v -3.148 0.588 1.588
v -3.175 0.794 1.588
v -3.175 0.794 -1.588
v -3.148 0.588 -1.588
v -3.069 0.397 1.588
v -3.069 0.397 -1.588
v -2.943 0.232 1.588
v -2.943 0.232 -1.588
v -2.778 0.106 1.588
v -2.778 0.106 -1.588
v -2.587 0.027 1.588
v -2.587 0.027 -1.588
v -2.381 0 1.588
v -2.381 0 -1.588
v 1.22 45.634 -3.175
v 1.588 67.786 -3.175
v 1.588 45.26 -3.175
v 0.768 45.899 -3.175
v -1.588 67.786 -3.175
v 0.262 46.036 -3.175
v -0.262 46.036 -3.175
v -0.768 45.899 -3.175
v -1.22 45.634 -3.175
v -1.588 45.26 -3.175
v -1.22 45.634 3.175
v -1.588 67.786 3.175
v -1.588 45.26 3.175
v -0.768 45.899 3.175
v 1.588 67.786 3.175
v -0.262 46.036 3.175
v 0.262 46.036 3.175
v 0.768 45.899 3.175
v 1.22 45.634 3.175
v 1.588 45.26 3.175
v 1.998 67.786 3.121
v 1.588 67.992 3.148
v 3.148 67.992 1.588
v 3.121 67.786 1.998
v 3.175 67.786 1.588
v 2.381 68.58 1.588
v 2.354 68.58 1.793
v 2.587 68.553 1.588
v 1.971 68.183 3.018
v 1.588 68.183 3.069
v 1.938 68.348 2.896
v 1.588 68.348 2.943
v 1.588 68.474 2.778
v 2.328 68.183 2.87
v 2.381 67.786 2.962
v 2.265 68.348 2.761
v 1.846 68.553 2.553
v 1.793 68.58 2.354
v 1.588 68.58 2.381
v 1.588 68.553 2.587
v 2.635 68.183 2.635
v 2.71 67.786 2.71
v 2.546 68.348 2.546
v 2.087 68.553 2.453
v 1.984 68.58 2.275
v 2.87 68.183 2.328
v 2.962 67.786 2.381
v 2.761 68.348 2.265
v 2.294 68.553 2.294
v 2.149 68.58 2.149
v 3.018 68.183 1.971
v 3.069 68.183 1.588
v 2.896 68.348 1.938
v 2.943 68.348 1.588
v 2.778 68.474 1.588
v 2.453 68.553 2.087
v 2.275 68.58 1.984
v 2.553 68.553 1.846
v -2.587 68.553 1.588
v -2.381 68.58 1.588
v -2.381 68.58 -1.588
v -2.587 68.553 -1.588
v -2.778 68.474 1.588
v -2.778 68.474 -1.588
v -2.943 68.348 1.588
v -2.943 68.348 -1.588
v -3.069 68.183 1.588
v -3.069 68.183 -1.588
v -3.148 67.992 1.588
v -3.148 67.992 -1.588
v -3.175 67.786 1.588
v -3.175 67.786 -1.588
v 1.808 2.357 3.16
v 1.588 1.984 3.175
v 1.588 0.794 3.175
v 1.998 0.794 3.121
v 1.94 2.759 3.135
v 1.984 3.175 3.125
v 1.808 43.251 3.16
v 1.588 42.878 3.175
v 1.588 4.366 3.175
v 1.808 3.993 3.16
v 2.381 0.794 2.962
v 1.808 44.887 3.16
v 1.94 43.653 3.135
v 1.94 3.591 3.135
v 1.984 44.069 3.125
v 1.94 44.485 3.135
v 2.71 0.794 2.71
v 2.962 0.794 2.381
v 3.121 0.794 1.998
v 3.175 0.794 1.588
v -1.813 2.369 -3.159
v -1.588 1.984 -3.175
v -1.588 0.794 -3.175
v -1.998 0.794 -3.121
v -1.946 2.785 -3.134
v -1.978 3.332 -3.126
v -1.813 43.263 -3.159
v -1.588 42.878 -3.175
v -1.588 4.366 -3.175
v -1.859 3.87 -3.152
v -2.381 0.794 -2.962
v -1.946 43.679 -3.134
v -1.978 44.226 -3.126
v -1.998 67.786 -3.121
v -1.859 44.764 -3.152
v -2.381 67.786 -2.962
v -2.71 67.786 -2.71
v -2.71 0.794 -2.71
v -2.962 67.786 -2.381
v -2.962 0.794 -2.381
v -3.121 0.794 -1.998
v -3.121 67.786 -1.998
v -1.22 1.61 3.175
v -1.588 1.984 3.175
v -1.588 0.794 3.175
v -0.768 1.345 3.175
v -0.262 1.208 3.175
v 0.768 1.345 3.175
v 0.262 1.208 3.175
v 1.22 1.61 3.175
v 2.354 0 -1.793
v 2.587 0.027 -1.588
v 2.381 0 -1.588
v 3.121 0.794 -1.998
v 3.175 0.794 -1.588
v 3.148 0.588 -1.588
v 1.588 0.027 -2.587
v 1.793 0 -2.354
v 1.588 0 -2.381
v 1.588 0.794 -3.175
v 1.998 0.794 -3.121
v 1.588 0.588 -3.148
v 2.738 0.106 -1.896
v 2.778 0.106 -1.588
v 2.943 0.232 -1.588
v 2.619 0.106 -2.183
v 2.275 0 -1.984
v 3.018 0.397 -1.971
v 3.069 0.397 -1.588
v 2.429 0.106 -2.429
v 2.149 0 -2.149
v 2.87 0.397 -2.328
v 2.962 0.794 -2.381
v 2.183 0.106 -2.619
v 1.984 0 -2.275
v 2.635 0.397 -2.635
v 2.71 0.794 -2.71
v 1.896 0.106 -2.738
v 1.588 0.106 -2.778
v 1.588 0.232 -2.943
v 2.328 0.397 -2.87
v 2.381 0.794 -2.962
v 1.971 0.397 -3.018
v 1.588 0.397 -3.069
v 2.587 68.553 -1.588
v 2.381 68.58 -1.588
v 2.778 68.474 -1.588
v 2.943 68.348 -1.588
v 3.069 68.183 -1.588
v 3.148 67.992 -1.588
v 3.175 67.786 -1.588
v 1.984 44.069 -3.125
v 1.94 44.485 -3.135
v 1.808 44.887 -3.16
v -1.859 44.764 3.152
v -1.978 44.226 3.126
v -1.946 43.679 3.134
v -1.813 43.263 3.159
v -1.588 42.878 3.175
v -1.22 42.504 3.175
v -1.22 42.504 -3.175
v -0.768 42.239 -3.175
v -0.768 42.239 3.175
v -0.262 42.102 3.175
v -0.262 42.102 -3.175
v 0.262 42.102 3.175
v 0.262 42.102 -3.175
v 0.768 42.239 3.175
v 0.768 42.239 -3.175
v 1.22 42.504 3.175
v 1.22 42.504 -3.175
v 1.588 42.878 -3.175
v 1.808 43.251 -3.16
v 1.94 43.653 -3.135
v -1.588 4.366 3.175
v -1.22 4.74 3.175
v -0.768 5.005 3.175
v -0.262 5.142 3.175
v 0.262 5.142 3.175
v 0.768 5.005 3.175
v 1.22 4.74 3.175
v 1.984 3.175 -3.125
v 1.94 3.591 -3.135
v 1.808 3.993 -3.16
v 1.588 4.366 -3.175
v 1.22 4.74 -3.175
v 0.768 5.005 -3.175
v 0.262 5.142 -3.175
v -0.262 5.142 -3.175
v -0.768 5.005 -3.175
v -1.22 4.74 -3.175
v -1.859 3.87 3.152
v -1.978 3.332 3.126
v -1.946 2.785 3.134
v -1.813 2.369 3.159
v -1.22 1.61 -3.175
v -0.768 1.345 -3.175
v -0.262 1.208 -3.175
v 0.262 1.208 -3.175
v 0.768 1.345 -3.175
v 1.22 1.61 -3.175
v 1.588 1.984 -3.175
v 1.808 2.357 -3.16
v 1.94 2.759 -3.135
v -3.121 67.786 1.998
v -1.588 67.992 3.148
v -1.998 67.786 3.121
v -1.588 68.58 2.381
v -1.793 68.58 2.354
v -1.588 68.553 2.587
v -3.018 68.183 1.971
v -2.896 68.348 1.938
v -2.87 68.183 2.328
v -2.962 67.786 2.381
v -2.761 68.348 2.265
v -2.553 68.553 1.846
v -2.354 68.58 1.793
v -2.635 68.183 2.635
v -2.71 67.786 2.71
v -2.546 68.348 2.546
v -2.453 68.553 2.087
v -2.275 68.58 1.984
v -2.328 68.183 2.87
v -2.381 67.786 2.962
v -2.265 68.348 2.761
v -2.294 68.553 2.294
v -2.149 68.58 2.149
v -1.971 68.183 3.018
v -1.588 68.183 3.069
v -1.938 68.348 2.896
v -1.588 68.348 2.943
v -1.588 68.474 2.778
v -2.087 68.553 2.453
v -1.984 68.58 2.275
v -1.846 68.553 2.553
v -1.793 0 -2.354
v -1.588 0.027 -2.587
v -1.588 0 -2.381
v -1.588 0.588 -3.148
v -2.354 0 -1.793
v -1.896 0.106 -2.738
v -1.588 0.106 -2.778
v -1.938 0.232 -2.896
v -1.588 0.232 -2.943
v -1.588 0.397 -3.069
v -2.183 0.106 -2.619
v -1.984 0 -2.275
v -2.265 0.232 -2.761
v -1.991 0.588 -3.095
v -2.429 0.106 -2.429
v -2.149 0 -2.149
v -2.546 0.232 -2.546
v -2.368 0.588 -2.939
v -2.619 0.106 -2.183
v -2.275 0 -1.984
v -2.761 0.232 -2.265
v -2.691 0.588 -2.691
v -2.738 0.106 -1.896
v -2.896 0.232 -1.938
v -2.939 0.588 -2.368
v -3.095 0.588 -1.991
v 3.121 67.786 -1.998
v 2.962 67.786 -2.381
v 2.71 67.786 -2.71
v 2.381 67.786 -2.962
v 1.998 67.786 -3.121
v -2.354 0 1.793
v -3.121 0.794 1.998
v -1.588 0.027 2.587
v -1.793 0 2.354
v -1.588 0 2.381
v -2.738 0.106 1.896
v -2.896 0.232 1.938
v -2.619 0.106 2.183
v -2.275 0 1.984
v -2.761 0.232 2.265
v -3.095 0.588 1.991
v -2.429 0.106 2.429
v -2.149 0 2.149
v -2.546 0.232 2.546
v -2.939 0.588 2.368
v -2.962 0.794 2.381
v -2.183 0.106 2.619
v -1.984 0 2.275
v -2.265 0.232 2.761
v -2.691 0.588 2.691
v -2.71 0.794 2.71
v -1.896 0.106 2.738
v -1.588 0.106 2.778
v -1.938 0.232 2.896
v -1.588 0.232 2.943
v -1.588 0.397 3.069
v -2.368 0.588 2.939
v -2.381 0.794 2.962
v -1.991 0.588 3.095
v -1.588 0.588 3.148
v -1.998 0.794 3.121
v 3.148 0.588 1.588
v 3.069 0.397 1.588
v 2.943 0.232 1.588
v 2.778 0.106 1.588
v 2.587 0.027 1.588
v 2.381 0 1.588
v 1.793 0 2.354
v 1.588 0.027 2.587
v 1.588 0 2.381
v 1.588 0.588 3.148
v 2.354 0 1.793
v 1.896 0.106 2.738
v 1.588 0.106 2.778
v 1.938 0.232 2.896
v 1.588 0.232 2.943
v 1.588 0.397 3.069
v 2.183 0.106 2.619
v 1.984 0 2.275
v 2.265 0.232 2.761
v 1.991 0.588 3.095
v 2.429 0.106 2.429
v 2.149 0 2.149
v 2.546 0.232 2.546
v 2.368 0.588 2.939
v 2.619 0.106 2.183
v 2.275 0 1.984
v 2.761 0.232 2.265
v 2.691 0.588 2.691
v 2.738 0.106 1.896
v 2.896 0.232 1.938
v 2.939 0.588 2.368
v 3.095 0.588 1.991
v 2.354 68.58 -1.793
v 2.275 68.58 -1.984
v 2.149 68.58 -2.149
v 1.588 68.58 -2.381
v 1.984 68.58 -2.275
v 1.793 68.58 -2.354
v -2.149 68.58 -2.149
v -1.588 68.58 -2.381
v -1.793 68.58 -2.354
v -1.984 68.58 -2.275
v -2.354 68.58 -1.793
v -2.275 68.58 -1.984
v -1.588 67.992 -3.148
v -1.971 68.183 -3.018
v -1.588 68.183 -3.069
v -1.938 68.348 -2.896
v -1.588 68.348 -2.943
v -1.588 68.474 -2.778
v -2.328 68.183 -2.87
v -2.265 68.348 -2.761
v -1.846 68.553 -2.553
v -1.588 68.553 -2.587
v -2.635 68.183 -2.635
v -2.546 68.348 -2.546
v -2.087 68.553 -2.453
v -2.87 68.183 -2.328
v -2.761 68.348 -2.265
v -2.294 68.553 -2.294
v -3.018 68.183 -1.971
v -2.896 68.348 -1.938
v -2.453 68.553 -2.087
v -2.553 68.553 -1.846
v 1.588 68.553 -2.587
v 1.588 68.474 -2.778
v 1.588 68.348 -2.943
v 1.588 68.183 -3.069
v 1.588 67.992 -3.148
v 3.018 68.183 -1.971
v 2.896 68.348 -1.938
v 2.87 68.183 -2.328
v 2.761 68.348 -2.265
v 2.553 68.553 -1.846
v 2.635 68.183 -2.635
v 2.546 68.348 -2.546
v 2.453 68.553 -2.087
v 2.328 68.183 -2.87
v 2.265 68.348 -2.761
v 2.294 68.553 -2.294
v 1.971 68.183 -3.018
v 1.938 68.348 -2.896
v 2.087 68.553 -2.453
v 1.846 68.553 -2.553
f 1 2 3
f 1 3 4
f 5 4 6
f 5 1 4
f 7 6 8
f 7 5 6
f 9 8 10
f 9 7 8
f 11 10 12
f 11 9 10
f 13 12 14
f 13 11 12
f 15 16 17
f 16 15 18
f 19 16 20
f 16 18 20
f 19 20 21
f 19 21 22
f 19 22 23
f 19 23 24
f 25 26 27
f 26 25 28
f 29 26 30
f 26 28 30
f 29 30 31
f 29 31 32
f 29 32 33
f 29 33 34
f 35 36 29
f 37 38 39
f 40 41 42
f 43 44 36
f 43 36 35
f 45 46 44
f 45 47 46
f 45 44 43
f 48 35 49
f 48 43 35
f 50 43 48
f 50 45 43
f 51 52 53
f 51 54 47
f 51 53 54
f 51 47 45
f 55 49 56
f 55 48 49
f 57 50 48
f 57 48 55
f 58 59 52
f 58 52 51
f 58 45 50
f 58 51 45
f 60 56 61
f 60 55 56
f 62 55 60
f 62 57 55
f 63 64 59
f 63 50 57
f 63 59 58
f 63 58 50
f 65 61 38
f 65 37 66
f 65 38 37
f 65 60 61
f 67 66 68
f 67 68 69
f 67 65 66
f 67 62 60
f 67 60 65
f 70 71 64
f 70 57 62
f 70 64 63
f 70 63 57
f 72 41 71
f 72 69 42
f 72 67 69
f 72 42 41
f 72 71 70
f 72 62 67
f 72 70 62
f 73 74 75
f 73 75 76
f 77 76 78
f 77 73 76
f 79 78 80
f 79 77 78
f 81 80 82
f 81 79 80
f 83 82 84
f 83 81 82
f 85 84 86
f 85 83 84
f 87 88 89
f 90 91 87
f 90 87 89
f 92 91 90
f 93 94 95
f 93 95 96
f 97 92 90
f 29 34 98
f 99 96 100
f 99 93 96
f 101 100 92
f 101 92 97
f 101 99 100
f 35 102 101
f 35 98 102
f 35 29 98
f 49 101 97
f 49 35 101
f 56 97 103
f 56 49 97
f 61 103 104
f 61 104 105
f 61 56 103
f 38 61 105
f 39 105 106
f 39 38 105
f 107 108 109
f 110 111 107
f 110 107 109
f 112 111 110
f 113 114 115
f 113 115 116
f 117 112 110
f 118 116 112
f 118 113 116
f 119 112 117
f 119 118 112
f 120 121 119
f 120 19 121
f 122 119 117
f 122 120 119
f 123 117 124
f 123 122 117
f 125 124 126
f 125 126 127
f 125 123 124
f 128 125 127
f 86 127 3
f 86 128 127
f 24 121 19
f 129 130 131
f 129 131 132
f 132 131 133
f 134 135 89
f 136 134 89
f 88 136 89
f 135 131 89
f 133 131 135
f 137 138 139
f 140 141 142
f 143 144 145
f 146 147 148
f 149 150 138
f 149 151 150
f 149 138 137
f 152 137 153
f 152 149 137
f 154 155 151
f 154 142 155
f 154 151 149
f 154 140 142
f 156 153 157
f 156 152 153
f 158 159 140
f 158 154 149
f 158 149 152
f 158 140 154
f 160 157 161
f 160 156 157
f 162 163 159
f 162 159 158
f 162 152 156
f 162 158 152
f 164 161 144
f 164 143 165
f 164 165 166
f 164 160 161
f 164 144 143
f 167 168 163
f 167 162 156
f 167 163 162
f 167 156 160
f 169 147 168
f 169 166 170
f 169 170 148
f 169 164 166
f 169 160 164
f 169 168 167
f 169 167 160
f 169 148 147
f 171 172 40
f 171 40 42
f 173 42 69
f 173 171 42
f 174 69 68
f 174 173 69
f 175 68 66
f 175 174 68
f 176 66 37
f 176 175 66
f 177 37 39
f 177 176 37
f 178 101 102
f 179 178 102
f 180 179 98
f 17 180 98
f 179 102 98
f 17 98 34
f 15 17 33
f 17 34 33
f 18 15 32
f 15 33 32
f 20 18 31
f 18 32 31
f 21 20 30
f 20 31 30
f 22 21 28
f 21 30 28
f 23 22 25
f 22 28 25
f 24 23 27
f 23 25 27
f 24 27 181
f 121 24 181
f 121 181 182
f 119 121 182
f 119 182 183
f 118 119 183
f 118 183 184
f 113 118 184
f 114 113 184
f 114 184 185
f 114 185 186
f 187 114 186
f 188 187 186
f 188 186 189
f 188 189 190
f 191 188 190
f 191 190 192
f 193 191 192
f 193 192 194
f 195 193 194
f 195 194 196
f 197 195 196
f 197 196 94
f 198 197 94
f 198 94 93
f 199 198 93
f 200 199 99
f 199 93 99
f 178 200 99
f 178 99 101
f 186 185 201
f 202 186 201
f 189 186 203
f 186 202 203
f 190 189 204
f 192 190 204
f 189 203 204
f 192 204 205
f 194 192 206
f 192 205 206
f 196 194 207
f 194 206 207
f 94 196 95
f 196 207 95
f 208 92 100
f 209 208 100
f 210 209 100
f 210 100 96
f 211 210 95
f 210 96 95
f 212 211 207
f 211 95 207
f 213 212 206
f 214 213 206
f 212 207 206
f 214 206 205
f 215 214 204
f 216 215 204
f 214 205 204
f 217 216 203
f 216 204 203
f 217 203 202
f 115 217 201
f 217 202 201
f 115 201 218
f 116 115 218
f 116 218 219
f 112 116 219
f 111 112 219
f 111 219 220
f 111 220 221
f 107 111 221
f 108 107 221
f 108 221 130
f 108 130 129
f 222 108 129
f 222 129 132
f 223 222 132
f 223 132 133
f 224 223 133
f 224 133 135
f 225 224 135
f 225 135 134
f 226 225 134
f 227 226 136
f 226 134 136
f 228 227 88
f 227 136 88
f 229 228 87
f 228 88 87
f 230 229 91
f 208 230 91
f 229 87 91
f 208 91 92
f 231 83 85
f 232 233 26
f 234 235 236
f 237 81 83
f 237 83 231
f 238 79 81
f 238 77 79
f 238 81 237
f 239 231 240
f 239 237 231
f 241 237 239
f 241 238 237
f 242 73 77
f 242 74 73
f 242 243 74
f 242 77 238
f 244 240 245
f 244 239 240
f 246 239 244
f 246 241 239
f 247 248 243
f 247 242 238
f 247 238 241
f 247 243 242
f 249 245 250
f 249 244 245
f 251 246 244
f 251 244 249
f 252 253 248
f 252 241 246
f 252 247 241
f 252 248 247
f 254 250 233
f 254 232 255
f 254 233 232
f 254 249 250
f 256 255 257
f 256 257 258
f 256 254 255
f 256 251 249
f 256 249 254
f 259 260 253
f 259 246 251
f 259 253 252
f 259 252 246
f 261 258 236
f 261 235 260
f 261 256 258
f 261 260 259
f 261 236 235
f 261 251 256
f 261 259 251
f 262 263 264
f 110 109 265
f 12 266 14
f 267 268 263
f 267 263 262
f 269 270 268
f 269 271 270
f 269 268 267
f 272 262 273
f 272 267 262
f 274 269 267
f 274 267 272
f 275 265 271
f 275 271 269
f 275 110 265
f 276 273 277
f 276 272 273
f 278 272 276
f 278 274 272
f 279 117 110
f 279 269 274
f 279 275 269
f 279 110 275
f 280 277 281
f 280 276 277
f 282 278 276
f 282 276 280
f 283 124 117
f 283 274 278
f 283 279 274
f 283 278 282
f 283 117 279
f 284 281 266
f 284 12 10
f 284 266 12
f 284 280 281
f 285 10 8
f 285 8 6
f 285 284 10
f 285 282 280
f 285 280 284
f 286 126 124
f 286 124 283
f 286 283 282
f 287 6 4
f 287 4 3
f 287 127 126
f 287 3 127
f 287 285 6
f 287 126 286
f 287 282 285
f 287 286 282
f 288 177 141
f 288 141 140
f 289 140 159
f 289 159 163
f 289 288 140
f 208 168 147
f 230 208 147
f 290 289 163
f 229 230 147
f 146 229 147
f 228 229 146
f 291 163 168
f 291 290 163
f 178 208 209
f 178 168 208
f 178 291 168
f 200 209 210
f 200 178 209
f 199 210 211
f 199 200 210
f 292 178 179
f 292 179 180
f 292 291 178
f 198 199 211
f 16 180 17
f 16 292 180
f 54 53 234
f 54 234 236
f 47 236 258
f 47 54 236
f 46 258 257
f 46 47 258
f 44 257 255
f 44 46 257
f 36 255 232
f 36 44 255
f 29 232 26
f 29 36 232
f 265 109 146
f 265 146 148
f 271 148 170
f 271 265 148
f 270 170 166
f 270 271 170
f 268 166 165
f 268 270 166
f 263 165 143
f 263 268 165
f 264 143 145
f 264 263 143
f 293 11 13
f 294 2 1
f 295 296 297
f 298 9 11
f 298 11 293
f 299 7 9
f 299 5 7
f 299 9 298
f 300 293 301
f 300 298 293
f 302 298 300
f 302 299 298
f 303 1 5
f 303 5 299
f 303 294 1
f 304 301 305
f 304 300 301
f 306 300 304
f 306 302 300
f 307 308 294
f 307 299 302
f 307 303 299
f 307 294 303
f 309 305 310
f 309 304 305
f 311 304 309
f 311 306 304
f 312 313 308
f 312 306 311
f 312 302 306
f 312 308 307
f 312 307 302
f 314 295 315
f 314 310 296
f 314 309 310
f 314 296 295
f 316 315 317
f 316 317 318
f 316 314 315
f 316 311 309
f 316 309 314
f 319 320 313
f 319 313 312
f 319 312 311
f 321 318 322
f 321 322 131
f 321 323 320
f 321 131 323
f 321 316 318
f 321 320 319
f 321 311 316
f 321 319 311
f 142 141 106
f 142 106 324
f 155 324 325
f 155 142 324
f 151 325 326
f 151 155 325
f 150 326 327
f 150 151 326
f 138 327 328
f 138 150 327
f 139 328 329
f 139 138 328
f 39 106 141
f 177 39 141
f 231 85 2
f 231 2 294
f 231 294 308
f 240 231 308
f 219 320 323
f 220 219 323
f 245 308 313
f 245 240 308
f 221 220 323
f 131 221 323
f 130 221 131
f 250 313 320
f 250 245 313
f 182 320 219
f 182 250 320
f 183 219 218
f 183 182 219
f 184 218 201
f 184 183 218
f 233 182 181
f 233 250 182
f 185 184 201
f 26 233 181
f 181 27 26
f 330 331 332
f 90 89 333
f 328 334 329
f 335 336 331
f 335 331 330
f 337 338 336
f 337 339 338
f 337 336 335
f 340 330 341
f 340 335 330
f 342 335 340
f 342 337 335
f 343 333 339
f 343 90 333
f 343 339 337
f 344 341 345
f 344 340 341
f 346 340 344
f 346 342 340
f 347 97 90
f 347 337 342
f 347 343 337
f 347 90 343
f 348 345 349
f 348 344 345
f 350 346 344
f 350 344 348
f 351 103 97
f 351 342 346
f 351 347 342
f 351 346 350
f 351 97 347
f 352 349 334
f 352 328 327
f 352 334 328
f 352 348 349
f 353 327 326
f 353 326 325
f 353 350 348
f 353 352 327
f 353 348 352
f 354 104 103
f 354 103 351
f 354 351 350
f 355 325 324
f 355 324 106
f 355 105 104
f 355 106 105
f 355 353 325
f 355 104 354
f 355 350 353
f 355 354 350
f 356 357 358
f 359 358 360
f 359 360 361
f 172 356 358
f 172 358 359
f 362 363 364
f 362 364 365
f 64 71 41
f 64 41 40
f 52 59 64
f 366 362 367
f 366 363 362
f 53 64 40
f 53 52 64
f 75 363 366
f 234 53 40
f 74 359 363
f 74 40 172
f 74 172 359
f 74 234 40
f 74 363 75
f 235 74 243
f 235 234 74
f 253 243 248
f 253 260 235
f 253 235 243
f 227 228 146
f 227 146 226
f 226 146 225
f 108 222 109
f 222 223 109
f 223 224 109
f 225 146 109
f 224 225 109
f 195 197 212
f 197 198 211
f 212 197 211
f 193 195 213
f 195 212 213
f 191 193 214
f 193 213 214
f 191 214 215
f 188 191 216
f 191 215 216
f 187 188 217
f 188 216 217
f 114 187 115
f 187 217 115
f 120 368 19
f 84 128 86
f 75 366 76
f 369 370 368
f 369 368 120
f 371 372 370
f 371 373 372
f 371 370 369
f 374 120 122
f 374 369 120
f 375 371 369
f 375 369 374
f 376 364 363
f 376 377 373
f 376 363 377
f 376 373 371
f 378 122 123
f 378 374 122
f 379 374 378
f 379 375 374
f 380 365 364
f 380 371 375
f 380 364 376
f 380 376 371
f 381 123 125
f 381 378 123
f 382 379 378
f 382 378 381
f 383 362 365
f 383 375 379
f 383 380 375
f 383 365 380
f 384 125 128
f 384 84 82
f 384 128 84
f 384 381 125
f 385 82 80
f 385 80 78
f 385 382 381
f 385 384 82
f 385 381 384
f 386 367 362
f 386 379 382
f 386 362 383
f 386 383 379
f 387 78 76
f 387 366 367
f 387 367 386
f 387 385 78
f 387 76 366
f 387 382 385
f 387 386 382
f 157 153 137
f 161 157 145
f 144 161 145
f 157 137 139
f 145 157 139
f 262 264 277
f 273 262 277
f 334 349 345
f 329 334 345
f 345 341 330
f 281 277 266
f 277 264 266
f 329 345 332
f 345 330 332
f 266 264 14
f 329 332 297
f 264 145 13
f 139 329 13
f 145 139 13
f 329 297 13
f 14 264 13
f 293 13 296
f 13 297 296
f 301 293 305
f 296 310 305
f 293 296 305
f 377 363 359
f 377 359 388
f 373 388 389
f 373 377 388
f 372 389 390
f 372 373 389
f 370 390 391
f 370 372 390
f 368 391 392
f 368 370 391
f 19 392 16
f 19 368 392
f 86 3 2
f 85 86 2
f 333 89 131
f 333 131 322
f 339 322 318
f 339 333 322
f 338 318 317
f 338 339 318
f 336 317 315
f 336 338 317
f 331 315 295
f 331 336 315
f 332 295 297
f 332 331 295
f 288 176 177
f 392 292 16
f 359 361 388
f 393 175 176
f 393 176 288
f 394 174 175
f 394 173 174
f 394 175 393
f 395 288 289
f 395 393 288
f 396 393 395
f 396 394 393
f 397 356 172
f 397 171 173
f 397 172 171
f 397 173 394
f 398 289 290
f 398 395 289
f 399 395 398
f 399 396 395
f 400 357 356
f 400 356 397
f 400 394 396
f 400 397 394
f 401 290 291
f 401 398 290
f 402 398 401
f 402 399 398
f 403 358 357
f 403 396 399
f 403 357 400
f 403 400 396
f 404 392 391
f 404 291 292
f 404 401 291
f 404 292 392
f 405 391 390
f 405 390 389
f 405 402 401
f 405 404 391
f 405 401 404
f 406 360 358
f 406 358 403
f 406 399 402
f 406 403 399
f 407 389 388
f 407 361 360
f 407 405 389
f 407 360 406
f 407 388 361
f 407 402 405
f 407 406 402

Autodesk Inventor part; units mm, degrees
ref_plane "YZ Plane" through (0, 0, 0) normal (1, 0, 0) x (0, 1, 0)
ref_plane "XZ Plane" through (0, 0, 0) normal (0, 1, 0) x (-1, 0, 0)
ref_plane "XY Plane" through (0, 0, 0) normal (0, 0, 1) x (1, 0, 0)
sketch "Sketch1" plane through (0, 0, 0) normal (0, 1, 0) x (-1, 0, 0)
  line L0 (-3.175, -3.175) -> (3.175, -3.175)
  line L1 (3.175, -3.175) -> (3.175, 3.175)
  line L2 (3.175, 3.175) -> (-3.175, 3.175)
  line L3 (-3.175, 3.175) -> (-3.175, -3.175)
  line L4 (-3.175, -3.175) -> (3.175, 3.175) construction
  line L5 (3.175, -3.175) -> (-3.175, 3.175) construction
  point P0 (0, 0)
  dimension "d0" = 6.35
  dimension "d1" = 6.35
extrude "Extrusion1" add sketch "Sketch1" along normal blind 68.58
fillet "Fillet1" radius 1.5875 4 edges at (3.175, 34.29, 3.175) (3.175, 34.29, -3.175) (-3.175, 34.29, -3.175) (-3.175, 34.29, 3.175)
fillet "Fillet2" radius 0.7937 16 edges at (2.71, 0, -2.71) (0, 0, -3.175) (-2.71, 0, -2.71) (-3.175, 0, 0) (-2.71, 0, 2.71) (0, 0, 3.175) (2.71, 0, 2.71) (3.175, 0, 0) (2.71, 68.58, -2.71) (0, 68.58, -3.175) (-2.71, 68.58, -2.71) (-3.175, 68.58, 0) (-2.71, 68.58, 2.71) (0, 68.58, 3.175) (2.71, 68.58, 2.71) (3.175, 68.58, 0)
sketch "Sketch2" plane through (-1.5875, 67.7863, 3.175) normal (0, 0, 1) x (1, 0, 0)
  circle A0 centre (1.5875, -64.6113) radius 1.9844
  line L0 (0, -67.7863) -> (3.175, -67.7863) projected
  point P0 (1.5875, -67.7863)
  dimension "d6" = 3.9688
  dimension "d7" = 3.175
extrude "Extrusion2" cut sketch "Sketch2" against normal blind 50.8
sketch "Sketch3" plane through (-1.5875, 67.7863, 3.175) normal (0, 0, 1) x (1, 0, 0)
  circle A0 centre (1.5875, -23.7173) radius 1.9844
  arc A1 (3.175, -63.4206) -> (0, -63.4206) centre (1.5875, -64.6113) ccw projected
  point P0 (1.5875, -67.7863)
  dimension "d10" = 3.9688
  dimension "d11" = 40.894
extrude "Extrusion3" cut sketch "Sketch3" against normal blind 50.8
properties part number "wedgec" material "Stainless Steel"
